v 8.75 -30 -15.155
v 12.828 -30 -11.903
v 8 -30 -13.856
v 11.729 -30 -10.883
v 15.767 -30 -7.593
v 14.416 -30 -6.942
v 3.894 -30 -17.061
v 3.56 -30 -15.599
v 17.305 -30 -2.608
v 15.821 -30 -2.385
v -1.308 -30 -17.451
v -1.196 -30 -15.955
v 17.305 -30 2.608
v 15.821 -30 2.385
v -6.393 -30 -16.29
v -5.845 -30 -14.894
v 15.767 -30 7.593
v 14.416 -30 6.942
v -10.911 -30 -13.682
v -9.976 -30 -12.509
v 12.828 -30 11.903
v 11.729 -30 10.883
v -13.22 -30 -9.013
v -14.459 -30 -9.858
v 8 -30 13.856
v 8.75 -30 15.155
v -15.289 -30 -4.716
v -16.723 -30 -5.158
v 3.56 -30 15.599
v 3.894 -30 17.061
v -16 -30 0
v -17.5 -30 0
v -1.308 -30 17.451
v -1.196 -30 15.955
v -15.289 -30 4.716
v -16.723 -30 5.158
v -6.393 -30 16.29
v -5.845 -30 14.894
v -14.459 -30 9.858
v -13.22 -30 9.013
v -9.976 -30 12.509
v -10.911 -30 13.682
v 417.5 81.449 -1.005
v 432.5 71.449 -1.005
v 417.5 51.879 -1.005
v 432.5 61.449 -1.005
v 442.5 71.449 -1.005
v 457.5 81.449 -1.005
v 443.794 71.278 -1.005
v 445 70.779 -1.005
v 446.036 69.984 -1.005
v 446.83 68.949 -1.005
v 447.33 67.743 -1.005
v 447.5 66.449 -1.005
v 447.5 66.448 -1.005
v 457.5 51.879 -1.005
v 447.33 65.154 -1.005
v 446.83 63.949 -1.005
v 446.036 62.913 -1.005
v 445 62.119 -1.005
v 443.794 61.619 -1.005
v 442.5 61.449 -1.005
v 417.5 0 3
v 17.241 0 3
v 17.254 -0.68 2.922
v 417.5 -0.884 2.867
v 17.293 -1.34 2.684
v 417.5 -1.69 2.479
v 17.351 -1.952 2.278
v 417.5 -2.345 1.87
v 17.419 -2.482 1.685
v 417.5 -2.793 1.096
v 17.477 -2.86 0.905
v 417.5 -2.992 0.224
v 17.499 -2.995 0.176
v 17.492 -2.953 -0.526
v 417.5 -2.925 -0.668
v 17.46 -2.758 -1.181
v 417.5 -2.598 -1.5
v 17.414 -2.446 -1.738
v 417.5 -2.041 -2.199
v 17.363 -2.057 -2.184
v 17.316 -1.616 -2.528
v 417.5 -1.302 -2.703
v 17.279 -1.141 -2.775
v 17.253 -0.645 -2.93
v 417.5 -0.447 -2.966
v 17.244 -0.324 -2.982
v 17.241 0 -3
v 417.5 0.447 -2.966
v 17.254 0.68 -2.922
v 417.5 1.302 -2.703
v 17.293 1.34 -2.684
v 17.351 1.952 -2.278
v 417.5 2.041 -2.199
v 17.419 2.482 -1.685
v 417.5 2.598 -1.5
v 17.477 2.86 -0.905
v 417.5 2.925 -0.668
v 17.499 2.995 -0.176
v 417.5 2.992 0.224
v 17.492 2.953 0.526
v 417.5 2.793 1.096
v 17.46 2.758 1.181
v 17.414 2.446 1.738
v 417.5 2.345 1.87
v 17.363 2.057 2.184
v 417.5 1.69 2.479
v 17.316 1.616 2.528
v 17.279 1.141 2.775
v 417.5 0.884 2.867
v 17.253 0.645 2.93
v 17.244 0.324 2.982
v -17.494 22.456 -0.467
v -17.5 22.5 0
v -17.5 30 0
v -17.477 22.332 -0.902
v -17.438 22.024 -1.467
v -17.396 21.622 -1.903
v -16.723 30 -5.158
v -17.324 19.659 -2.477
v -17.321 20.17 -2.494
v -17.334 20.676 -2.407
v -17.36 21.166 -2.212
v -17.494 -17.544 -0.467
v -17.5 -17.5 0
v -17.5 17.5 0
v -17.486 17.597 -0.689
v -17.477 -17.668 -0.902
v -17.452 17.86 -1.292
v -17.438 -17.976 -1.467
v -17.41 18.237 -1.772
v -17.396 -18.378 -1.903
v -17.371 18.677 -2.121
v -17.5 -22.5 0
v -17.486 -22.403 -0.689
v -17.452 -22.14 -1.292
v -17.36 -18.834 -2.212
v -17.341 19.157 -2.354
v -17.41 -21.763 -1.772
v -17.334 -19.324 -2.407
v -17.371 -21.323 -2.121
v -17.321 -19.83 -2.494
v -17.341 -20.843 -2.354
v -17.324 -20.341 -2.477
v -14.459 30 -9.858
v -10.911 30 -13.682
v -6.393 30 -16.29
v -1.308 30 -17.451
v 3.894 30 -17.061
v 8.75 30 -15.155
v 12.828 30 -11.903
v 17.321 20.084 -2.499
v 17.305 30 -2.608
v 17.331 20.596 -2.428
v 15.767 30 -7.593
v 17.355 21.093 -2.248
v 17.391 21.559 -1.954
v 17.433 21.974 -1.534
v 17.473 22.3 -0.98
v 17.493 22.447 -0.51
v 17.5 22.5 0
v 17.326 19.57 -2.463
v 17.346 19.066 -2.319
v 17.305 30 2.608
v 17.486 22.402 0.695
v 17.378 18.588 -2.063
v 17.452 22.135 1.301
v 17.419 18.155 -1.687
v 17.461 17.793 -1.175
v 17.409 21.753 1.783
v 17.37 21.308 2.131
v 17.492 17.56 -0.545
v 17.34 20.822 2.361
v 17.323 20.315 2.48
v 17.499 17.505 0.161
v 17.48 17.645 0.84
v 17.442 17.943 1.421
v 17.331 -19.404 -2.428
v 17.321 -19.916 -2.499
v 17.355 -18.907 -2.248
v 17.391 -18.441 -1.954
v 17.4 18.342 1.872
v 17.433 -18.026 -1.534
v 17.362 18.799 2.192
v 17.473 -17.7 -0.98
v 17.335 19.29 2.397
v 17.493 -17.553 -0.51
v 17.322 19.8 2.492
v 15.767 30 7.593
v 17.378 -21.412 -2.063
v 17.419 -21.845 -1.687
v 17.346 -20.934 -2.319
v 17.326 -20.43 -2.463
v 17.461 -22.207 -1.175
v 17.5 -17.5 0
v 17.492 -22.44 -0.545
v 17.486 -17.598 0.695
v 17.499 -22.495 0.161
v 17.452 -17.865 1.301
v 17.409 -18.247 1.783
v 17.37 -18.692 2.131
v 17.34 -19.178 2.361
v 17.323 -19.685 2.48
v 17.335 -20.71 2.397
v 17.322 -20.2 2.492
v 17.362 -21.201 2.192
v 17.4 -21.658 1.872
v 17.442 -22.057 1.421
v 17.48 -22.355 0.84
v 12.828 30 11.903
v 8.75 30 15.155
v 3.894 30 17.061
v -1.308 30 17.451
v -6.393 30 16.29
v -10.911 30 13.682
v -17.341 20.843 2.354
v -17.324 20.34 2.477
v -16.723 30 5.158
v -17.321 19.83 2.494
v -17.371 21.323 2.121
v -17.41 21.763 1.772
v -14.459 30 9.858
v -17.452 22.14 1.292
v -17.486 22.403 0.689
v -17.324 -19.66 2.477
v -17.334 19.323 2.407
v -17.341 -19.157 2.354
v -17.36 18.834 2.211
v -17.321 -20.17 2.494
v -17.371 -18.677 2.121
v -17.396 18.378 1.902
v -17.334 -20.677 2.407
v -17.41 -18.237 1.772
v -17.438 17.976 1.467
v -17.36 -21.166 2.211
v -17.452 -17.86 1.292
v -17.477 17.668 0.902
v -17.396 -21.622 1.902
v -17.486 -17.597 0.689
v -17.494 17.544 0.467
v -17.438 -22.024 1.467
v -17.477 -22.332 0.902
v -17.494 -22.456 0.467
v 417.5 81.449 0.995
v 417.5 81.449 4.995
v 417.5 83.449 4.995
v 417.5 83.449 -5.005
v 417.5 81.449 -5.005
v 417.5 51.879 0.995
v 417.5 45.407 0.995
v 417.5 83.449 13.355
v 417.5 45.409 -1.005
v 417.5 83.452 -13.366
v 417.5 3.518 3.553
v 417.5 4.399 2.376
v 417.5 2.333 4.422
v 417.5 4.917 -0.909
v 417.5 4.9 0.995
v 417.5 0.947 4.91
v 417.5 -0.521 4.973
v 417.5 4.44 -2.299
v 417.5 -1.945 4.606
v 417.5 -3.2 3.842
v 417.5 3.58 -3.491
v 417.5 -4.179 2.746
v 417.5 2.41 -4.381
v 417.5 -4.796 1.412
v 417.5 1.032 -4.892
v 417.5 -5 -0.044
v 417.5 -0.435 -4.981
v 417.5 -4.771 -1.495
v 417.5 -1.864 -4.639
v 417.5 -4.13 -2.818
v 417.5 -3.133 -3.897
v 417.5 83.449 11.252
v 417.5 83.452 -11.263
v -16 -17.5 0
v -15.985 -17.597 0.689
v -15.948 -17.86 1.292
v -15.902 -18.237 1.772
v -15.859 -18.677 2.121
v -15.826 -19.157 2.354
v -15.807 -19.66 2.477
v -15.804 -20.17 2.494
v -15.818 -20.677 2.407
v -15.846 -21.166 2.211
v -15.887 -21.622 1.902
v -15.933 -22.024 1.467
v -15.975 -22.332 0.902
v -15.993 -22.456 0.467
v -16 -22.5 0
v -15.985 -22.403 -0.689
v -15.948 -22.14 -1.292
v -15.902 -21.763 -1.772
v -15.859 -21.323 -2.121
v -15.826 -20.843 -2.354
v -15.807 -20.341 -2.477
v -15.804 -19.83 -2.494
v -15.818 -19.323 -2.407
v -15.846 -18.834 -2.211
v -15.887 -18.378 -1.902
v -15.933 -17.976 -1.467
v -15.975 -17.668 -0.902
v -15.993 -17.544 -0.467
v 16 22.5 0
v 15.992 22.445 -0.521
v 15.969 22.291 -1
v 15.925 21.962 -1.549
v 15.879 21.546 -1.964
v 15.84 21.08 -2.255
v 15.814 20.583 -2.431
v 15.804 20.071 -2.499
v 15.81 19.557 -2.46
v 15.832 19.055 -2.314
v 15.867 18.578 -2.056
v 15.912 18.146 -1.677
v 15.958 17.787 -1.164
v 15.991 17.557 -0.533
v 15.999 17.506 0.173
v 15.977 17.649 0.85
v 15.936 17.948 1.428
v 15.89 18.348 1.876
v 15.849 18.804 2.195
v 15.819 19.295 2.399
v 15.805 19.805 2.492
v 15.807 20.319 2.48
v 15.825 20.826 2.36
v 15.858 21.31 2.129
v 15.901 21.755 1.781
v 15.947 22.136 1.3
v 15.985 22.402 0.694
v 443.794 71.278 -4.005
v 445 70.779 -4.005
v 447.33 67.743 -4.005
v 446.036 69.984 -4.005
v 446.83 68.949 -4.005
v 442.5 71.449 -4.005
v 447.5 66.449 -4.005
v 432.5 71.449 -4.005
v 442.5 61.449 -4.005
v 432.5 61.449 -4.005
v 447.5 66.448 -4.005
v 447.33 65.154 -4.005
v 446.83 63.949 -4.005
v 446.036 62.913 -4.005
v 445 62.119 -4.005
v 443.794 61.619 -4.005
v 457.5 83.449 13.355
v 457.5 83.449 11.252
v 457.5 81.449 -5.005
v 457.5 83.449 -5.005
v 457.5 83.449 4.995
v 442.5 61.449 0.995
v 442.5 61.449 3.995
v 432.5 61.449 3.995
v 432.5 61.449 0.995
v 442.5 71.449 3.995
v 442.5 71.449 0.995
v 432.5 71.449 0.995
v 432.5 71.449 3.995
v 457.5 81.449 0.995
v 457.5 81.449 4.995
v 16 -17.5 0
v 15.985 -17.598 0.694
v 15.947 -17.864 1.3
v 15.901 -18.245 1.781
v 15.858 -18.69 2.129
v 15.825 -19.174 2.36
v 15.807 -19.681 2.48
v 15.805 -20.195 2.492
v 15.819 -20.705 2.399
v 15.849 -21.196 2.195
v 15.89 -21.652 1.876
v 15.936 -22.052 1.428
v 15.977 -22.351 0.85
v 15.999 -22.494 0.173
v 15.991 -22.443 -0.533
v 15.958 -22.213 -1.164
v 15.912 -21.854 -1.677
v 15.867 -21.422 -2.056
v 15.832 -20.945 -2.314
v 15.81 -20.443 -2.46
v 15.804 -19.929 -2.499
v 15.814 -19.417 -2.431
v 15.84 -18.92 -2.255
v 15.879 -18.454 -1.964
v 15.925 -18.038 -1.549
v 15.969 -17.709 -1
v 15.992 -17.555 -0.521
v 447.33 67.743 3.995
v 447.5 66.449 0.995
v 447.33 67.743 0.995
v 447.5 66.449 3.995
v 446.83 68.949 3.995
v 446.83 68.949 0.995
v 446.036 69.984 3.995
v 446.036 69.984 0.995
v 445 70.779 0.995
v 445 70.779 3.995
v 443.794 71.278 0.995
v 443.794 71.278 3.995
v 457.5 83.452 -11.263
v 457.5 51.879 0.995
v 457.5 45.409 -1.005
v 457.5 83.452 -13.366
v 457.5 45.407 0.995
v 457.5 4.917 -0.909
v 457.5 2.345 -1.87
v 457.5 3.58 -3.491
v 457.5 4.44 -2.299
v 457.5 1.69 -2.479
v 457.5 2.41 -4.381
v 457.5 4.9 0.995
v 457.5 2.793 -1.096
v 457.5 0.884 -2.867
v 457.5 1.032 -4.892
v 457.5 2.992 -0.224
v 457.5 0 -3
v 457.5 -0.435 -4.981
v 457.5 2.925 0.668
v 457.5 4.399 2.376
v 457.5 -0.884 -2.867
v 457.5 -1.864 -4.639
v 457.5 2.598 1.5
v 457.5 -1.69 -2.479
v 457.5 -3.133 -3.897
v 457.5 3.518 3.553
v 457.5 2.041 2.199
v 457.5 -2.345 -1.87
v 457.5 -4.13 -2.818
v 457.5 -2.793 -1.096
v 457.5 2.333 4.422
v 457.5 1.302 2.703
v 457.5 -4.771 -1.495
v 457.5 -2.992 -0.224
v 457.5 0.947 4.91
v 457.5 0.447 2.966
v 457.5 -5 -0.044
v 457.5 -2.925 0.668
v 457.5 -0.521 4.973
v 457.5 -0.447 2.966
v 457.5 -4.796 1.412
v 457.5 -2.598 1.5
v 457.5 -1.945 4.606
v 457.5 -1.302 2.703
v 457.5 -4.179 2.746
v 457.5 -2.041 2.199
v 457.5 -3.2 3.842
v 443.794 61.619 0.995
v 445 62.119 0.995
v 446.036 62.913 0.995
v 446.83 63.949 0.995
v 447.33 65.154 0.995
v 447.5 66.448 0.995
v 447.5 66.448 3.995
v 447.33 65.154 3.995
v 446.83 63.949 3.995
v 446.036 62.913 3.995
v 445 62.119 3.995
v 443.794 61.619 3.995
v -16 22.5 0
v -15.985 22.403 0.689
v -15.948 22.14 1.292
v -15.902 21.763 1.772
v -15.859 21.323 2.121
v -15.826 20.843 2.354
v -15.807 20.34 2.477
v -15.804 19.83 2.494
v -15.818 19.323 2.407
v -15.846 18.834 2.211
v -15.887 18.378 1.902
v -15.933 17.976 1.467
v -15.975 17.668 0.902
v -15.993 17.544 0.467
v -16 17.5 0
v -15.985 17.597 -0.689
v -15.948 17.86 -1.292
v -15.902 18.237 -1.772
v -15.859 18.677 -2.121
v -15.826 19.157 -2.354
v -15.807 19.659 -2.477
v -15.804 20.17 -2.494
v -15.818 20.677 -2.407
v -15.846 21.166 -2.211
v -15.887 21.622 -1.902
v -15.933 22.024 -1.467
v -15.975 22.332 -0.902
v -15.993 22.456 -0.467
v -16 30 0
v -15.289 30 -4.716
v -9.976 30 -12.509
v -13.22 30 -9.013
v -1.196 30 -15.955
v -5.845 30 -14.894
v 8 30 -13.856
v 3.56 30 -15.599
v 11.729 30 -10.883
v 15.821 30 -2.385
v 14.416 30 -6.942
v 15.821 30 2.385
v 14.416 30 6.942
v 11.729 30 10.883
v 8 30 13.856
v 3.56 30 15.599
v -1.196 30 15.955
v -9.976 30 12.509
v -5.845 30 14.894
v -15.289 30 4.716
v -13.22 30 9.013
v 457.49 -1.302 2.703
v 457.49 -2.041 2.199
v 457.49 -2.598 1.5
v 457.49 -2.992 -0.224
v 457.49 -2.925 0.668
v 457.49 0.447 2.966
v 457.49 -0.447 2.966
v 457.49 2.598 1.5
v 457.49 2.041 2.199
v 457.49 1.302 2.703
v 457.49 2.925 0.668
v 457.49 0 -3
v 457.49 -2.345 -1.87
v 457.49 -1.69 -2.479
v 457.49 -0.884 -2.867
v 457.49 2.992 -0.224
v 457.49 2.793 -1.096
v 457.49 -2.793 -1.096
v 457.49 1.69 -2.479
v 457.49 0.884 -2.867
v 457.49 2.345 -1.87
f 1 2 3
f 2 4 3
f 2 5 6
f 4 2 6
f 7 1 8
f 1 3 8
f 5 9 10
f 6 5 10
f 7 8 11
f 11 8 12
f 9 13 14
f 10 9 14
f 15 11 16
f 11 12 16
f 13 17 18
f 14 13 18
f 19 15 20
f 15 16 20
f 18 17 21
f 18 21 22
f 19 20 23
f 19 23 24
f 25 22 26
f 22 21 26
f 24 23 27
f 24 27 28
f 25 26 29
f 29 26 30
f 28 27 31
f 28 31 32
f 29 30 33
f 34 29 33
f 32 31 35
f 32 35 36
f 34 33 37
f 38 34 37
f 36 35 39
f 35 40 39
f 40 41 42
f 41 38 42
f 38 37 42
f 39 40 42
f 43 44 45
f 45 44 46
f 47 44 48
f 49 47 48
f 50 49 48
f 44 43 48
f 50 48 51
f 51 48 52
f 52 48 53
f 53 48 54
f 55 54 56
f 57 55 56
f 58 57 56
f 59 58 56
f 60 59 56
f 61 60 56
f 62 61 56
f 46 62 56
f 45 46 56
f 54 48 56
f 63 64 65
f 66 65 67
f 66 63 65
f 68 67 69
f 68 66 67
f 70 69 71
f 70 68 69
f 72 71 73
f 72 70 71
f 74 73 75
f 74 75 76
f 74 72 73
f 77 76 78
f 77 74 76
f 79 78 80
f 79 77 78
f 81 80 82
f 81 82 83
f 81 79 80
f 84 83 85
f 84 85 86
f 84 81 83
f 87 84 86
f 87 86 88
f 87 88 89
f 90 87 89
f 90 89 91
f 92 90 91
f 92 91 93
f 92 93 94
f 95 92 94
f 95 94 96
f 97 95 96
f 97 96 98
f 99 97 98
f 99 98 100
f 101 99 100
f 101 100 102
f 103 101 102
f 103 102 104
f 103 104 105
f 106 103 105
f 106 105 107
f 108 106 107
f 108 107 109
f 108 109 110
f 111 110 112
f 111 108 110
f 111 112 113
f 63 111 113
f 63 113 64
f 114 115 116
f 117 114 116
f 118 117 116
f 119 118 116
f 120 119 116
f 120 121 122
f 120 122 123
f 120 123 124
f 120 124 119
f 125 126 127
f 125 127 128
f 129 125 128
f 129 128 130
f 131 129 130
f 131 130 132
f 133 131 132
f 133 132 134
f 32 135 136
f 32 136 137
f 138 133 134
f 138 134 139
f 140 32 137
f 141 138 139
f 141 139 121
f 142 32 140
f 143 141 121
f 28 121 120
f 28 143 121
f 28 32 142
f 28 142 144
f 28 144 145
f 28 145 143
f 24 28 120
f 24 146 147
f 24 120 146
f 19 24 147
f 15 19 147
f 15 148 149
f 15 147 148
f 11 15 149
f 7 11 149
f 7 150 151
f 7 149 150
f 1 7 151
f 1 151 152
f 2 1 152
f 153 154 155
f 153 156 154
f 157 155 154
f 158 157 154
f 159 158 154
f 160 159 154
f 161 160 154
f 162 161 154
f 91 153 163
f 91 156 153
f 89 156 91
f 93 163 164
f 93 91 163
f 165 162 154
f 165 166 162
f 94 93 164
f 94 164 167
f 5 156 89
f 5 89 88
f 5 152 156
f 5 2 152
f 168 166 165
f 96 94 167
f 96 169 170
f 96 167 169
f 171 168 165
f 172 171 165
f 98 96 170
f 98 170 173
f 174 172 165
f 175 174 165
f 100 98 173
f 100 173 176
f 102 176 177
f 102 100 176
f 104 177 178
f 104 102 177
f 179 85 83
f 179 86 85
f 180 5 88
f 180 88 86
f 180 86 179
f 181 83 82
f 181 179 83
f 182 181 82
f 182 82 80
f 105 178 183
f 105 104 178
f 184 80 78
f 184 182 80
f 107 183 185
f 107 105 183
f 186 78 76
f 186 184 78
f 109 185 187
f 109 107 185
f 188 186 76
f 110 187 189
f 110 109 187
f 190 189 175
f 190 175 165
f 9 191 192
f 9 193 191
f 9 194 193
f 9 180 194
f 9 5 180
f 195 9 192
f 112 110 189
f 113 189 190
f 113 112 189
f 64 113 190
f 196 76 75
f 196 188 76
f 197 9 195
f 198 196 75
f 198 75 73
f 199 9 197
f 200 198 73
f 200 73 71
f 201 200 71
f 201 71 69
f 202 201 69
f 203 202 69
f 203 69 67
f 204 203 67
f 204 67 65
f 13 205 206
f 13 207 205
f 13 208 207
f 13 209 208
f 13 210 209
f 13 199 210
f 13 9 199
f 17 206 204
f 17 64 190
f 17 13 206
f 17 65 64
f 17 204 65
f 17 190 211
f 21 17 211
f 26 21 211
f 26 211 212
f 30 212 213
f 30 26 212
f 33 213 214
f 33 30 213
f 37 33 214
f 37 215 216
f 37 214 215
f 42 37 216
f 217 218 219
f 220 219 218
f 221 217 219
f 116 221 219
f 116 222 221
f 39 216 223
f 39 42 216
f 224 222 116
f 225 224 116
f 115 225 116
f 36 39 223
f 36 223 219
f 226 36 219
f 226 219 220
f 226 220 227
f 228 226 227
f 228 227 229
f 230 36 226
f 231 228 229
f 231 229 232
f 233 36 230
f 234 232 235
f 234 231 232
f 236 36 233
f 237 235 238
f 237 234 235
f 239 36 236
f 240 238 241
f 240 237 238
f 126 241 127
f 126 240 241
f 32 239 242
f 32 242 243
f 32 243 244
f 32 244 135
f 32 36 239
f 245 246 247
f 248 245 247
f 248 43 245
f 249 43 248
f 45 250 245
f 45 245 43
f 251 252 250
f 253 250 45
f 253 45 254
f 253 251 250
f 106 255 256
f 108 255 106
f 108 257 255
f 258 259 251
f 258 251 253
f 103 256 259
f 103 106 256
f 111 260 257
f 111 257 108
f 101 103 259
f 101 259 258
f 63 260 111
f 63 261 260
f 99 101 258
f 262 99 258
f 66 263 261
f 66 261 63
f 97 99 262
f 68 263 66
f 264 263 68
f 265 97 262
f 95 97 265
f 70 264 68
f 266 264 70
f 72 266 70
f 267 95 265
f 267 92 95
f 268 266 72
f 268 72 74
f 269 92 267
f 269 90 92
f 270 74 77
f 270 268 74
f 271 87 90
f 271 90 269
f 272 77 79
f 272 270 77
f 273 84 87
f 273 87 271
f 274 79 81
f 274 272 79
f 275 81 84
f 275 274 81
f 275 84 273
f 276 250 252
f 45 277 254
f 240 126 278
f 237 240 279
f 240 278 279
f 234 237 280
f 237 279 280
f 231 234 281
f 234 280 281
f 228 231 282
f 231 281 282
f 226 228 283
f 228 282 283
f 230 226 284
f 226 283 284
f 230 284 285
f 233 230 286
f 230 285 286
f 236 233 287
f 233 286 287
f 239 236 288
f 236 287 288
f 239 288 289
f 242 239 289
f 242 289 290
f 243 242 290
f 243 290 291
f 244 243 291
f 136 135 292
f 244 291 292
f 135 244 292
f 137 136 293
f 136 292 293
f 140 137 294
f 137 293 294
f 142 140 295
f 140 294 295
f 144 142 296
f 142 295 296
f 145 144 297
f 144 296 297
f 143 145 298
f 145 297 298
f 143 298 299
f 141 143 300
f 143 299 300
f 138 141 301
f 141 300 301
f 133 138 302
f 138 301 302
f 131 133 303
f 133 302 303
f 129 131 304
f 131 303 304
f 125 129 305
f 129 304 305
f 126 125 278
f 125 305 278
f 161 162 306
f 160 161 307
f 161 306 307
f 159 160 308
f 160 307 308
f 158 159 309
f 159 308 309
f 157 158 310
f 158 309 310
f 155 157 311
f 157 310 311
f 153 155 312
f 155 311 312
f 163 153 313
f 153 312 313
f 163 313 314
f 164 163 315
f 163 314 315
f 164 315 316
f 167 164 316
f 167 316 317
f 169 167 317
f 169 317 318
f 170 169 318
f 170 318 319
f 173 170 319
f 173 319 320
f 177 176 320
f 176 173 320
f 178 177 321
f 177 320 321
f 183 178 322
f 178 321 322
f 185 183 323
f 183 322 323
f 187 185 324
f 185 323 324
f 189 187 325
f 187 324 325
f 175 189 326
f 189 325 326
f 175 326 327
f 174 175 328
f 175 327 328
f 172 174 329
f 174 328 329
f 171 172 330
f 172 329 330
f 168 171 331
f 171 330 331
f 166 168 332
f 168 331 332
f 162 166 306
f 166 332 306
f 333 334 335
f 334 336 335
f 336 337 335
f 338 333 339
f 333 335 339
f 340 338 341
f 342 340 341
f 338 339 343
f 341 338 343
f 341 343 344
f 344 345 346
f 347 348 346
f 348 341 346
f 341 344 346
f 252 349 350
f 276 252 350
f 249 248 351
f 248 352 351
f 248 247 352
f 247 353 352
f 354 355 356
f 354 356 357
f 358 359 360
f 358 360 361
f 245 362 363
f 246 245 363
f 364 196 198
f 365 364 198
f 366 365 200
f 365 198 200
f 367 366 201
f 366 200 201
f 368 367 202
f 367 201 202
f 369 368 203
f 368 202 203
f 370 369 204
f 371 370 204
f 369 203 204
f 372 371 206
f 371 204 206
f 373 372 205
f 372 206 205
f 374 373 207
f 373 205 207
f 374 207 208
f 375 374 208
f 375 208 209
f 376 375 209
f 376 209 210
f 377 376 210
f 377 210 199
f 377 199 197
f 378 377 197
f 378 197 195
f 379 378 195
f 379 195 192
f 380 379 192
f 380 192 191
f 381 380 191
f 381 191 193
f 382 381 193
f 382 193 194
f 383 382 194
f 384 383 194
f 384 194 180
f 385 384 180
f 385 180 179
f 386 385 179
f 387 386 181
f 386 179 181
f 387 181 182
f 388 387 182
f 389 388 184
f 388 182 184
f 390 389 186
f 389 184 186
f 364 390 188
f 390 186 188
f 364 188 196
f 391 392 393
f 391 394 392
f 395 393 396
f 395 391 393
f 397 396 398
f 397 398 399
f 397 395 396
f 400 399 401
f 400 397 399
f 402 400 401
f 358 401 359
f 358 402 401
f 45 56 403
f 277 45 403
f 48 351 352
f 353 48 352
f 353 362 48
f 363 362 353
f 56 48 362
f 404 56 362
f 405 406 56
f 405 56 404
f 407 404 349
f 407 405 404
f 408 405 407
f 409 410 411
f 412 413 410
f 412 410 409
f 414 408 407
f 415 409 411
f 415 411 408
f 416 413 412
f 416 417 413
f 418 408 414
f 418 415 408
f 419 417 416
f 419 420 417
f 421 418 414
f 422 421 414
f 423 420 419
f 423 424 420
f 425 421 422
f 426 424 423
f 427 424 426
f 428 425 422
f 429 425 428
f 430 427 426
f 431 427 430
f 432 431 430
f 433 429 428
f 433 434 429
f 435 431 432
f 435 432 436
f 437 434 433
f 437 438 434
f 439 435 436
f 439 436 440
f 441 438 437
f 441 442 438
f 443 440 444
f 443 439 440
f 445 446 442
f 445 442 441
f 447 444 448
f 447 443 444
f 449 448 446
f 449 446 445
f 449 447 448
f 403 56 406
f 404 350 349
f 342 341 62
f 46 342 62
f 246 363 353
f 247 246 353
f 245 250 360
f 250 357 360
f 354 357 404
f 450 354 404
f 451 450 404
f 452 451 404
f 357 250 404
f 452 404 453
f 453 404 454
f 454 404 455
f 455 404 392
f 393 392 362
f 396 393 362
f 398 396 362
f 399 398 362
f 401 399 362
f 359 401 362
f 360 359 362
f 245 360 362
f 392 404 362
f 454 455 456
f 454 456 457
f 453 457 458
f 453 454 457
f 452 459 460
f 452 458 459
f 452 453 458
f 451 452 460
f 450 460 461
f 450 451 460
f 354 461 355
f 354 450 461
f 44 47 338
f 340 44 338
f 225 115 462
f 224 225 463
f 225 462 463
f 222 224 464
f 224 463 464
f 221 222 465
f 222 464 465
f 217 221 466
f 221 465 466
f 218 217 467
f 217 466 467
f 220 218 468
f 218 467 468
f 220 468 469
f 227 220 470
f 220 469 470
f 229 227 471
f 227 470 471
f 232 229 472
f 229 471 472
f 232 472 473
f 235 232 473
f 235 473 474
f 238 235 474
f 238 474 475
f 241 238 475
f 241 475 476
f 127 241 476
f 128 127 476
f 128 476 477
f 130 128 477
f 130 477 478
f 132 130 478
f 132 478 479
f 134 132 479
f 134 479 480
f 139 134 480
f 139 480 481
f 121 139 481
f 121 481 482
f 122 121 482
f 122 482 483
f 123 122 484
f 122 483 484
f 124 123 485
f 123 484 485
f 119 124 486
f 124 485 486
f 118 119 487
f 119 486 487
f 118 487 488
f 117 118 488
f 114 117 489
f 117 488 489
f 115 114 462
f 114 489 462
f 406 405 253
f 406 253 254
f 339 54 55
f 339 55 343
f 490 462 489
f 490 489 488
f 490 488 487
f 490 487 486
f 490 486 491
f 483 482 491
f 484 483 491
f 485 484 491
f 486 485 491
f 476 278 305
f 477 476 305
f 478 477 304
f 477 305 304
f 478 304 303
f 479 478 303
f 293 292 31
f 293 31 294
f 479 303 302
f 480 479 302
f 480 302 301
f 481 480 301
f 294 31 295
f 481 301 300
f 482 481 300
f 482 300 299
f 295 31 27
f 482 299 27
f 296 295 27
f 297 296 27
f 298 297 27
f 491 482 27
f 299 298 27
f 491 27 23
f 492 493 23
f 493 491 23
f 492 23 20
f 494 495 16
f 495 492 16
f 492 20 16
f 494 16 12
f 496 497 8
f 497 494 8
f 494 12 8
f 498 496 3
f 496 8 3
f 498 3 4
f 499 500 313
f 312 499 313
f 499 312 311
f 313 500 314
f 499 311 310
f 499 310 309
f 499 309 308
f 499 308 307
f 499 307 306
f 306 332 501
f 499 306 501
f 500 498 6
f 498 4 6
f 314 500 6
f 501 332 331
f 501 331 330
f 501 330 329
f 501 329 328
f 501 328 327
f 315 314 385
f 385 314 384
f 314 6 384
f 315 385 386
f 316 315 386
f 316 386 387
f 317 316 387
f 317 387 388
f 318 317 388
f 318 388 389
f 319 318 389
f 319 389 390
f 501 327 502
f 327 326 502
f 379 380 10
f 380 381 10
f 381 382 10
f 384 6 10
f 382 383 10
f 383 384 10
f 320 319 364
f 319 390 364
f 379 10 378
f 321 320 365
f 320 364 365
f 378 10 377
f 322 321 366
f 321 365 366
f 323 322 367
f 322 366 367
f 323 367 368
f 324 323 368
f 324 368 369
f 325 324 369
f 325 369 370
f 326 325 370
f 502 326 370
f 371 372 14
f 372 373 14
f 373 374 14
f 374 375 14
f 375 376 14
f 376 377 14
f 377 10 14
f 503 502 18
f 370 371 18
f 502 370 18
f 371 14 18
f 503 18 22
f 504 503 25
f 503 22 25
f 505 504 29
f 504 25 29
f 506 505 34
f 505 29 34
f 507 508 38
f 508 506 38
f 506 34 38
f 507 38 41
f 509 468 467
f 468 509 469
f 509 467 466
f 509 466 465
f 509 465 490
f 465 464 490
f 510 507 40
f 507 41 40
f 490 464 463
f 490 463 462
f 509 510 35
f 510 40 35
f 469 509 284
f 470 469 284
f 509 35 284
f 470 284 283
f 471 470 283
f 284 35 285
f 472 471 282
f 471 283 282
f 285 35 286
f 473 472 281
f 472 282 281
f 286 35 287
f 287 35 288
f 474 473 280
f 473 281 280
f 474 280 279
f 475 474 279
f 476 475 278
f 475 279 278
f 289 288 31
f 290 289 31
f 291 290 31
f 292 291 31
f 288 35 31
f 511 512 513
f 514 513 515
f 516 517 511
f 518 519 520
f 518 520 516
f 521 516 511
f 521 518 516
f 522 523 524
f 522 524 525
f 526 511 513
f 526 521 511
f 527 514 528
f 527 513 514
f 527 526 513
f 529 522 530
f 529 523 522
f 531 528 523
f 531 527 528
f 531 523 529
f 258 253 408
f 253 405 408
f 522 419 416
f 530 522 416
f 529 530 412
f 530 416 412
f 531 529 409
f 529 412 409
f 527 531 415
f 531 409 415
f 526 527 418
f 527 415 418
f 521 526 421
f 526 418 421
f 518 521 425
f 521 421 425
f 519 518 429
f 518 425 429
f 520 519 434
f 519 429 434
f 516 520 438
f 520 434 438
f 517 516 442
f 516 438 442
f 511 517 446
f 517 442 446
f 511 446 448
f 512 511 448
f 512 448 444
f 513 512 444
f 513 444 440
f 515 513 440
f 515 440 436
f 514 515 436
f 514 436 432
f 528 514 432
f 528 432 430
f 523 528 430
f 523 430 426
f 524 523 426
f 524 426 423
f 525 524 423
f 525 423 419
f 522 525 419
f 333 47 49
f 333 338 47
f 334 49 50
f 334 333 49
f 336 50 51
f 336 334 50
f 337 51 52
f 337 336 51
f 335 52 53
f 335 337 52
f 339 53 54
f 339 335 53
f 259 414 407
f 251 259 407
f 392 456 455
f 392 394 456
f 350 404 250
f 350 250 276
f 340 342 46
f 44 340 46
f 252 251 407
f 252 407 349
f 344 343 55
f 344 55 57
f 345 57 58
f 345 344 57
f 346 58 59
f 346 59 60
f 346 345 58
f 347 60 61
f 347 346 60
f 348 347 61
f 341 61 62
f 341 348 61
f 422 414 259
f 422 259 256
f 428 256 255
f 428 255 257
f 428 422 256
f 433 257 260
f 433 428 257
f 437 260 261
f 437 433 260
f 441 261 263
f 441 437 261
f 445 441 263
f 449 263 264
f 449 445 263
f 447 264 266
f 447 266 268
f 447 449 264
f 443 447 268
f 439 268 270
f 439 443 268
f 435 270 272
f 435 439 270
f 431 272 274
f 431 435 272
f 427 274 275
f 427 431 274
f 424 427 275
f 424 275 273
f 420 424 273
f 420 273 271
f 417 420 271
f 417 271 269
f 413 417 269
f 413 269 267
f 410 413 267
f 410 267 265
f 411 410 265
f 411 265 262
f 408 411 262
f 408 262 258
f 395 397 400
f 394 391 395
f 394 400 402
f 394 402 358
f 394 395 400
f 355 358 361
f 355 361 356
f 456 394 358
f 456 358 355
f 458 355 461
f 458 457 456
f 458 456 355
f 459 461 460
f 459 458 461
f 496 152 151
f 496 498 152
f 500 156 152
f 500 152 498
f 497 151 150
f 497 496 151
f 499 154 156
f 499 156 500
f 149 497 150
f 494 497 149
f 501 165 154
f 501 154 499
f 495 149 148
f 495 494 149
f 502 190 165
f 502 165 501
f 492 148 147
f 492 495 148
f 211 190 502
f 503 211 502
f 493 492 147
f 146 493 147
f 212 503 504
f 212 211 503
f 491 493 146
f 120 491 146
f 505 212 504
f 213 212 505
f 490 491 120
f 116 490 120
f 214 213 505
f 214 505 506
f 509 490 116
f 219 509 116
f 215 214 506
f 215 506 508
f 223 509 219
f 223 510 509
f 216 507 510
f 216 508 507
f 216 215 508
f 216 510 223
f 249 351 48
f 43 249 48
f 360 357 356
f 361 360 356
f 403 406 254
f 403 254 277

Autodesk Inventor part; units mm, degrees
ref_plane "YZ Plane" through (0, 0, 0) normal (1, 0, 0) x (0, 1, 0)
ref_plane "XZ Plane" through (0, 0, 0) normal (0, 1, 0) x (-1, 0, 0)
ref_plane "XY Plane" through (0, 0, 0) normal (0, 0, 1) x (1, 0, 0)
sketch "Esboço1" plane through (0, 0, 0) normal (0, 1, 0) x (-1, 0, 0)
  circle A0 centre (0, 0) radius 16
  circle A1 centre (0, 0) radius 17.5
  dimension "d0" = 32
  dimension "d1" = 35
extrude "Extrusão1" add sketch "Esboço1" along normal mid plane 60
sketch "Esboço2" plane through (0, 0, 0) normal (0, 1, 0) x (-1, 0, 0)
  circle A0 centre (0, 0) radius 17.5 projected
  line L0 (-17.5, 0) -> (-417.5, 0)
  line L1 (-417.5, 0) -> (-417.5, 3)
  circle A1 centre (0, 0) radius 9.5
  line L2 (-26.4835, 0) -> (-26.4835, 3)
  line L3 (-17.2409, 3) -> (-417.5, 3)
  point P0 (-15.8635, 7.3891)
  dimension "d4" = 400
  dimension "d5" = 3
  dimension "d6" = 19
  dimension "d60" = 3
revolve "Revolução1" add sketch "Esboço2" angle 360 about axis through (17.5, 0, 0) along (1, 0, 0) contours A0 L0 L2 L3 | L2 L0 L1 L3
sketch "Esboço3" plane through (0, 0, 0) normal (0, 1, 0) x (-1, 0, 0)
  line L0 (-417.5, -3) -> (-417.5, 3) projected
  line L1 (-417.5, 0) -> (-417.5, 15)
  line L2 (-417.5, 15) -> (-417.5, -15)
  line L3 (-417.5, -15) -> (-457.5, -15)
  line L4 (-457.5, -15) -> (-457.5, 15)
  line L5 (-457.5, 15) -> (-417.5, 15)
  point P0 (0, 0)
  dimension "d8" = 15
  dimension "d9" = 30
  dimension "d10" = 40
extrude "Extrusão2" add sketch "Esboço3" along normal mid plane 170
sketch "Esboço5" plane through (457.5, -85, -15) normal (1, 0, 0) x (0, 0, -1)
  circle A0 centre (-15, 85) radius 4
  circle A1 centre (-15, 85) radius 3 projected
  line L0 (-16.25, 88.0318) -> (-14.25, 88.0318)
  line L1 (-14.25, 88.0318) -> (-14.25, 87.9047)
  line L2 (-14.25, 87.9047) -> (0, 87.9047)
  line L3 (0, 0) -> (0, 170) projected
  line L4 (-15.75, 87.9047) -> (-30, 87.9047)
  line L5 (-30, 170) -> (-30, 0) projected
  line L6 (-30, 87.9047) -> (-30, 0)
  line L7 (0, 0) -> (-30, 0) projected
  line L8 (-30, 0) -> (0, 0)
  line L9 (0, 0) -> (0, 87.9047)
  circle A2 centre (-15, 85) radius 5
  line L10 (-15.9946, 130.4066) -> (-13.9946, 130.4094)
  line L11 (-13.9946, 130.4094) -> (-14.0909, 89.9167)
  line L12 (-15.9946, 130.4066) -> (-28.3553, 168.4488)
  line L13 (-15.9946, 130.4066) -> (24.0054, 130.4066) construction
  line L14 (-13.9946, 130.4094) -> (-1.6339, 168.4517)
  line L15 (-13.9946, 130.4094) -> (26.0054, 130.4094) construction
  line L16 (-18.099, 136.8832) -> (-16.1969, 137.5013)
  line L17 (-25.4193, 159.413) -> (-23.5172, 160.031)
  line L18 (-4.4713, 159.7191) -> (-6.3734, 160.3371)
  line L19 (-10.3922, 141.4965) -> (-12.2943, 142.1146)
  line L20 (-28.3553, 168.4488) -> (-26.2523, 168.4488)
  line L21 (-1.6339, 168.4517) -> (-3.7368, 168.4517)
  line L22 (-15.0524, 134.2763) -> (-15.0666, 134.2336)
  line L23 (-15.9946, 168.4488) -> (-13.9946, 168.4488)
  line L24 (-15.9946, 89.9001) -> (-15.9946, 130.4066)
  line L25 (-15.9946, 136.8787) -> (-15.9946, 168.4488)
  line L26 (-13.9946, 168.4488) -> (-13.9946, 136.8787)
  line L27 (-15.9946, 136.8787) -> (-26.2523, 168.4488)
  line L28 (-13.9946, 136.8787) -> (-3.7368, 168.4517)
  line L29 (-15.9946, 168.4488) -> (-19.9946, 168.4488)
  line L30 (-19.9946, 168.4488) -> (-9.9946, 168.4488)
  line L31 (-9.9946, 168.4488) -> (-9.9946, 166.4488)
  line L32 (-9.9946, 166.4488) -> (-19.9946, 166.4488)
  line L33 (-19.9946, 166.4488) -> (-19.9946, 168.4488)
  line L34 (-15.9946, 168.4488) -> (-15.9946, 156.4488)
  line L35 (-15.9946, 156.4488) -> (-18.9946, 156.4488)
  line L36 (-18.9946, 156.4488) -> (-18.9946, 146.4488)
  line L37 (-18.9946, 146.4488) -> (-15.9946, 146.4488)
  line L38 (-13.9946, 156.4488) -> (-10.9946, 156.4488)
  line L39 (-10.9946, 156.4488) -> (-10.9946, 146.4488)
  line L40 (-10.9946, 146.4488) -> (-13.9946, 146.4488)
  line L41 (-30, 170) -> (0, 170) projected
  line L42 (-30, 170) -> (-30, 0)
  line L43 (0, 0) -> (0, 170) projected
  line L44 (0, 0) -> (-30, 0)
  line L45 (0, 0) -> (0, 170)
  line L46 (-30, 170) -> (0, 170)
  point P0 (-15, 85)
  point P1 (-15.9946, 166.4488)
  point P2 (-13.9946, 166.4488)
  dimension "d15" = 10
  dimension "d17" = 2
  dimension "d19" = 40
  dimension "d20" = 108
  dimension "d21" = 40
  dimension "d22" = 72
  dimension "d23" = 2
  dimension "d24" = 2
  dimension "d25" = 2
  dimension "d26" = 2
  dimension "d29" = 36
  dimension "d31" = 2
  dimension "d34" = 4
  dimension "d35" = 10
  dimension "d36" = 2
  dimension "d37" = 12
  dimension "d38" = 3
  dimension "d39" = 10
  dimension "d40" = 3
  dimension "d42" = 10
extrude "Extrusão3" cut sketch "Esboço5" against normal blind 170 contours A2 L11 L14 L21 L28 L26 L40 L39 L38 L32 L31 L30 L23 L29 L33 L25 L35 L36 L37 L27 L20 L12 L24 L4 L5 L41 L3 L2 | L2 L3 L7 L5 L4 A2
sketch "Esboço6" plane through (457.5, 4.9001, 0.9946) normal (1, 0, 0) x (0, 0, -1)
  circle A0 centre (0.9946, -4.9001) radius 3
  dimension "d61" = 6
extrude "Extrusão4" cut sketch "Esboço6" against normal blind 0.01
sketch "Esboço7" plane through (457.5, 4.9001, 0.9946) normal (1, 0, 0) x (0, 0, -1)
  line L0 (0, 66.5487) -> (-3, 66.5487) projected
  line L1 (-3, 56.5487) -> (0, 56.5487) projected
  line L2 (0, 66.5487) -> (0, 56.5487)
  line L3 (0, 56.5487) -> (-3, 56.5487)
  line L4 (-3, 66.5487) -> (-3, 56.5487) projected
  line L5 (-3, 56.5487) -> (-3, 66.5487)
  line L6 (-3, 66.5487) -> (0, 66.5487)
  line L7 (2, 56.5487) -> (5, 56.5487) projected
  line L8 (2, 56.5487) -> (5, 56.5487)
  line L9 (2, 66.5487) -> (5, 66.5487) projected
  line L10 (5, 56.5487) -> (5, 66.5487)
  line L11 (5, 66.5487) -> (2, 66.5487)
  line L12 (2, 66.5487) -> (2, 56.5487)
  point P0 (0.9946, -4.9001)
extrude "Extrusão5" cut sketch "Esboço7" against normal blind 10
sketch "Esboço8" plane through (417.5, 4.9001, 0.9946) normal (-1, 0, 0) x (0, 0, 1)
  line L0 (-2, 76.5487) -> (-2, 66.5487) projected
  line L1 (-2, 56.5487) -> (-2, 46.9786) projected
  line L2 (-2, 66.5487) -> (-2, 56.5487)
  line L3 (-5, 56.5487) -> (-2, 56.5487) projected
  line L4 (-2, 56.5487) -> (-5, 56.5487)
  line L5 (-5, 56.5487) -> (-5, 66.5487)
  line L6 (-5, 66.5487) -> (-2, 66.5487)
  line L7 (3, 66.5487) -> (0, 66.5487) projected
  line L8 (0, 66.5487) -> (3, 66.5487)
  line L9 (3, 66.5487) -> (3, 56.5487)
  line L10 (0, 46.9786) -> (0, 56.5487) projected
  line L11 (3, 56.5487) -> (0, 56.5487)
  line L12 (0, 56.5487) -> (0, 66.5487)
  line L13 (0, 76.5487) -> (0, 46.9786) projected
  point P0 (-0.9946, -4.9001)
extrude "Extrusão6" cut sketch "Esboço8" against normal blind 15
fillet "Arredondamento1" radius 5 4 edges at (447.5, 71.4488, 2.4946) (447.5, 61.4488, 2.4946) (447.5, 61.4488, -2.5054) (447.5, 71.4488, -2.5054)
sketch "Esboço9" plane through (0, 0, 0) normal (1, 0, 0) x (0, 1, 0)
  line L0 (30, -17.5) -> (30, 17.5) projected
  line L1 (30, 0) -> (20, 0)
  line L2 (-30, -16) -> (-30, 16) projected
  line L3 (-30, 0) -> (-20, 0)
  circle A0 centre (20, 0) radius 2.5
  circle A1 centre (-20, 0) radius 2.5
  point P0 (0, 0)
  dimension "d52" = 10
  dimension "d53" = 10
  dimension "d56" = 5
  dimension "d57" = 5
extrude "Extrusão7" cut sketch "Esboço9" along normal mid plane 150
properties part number "LDR"
